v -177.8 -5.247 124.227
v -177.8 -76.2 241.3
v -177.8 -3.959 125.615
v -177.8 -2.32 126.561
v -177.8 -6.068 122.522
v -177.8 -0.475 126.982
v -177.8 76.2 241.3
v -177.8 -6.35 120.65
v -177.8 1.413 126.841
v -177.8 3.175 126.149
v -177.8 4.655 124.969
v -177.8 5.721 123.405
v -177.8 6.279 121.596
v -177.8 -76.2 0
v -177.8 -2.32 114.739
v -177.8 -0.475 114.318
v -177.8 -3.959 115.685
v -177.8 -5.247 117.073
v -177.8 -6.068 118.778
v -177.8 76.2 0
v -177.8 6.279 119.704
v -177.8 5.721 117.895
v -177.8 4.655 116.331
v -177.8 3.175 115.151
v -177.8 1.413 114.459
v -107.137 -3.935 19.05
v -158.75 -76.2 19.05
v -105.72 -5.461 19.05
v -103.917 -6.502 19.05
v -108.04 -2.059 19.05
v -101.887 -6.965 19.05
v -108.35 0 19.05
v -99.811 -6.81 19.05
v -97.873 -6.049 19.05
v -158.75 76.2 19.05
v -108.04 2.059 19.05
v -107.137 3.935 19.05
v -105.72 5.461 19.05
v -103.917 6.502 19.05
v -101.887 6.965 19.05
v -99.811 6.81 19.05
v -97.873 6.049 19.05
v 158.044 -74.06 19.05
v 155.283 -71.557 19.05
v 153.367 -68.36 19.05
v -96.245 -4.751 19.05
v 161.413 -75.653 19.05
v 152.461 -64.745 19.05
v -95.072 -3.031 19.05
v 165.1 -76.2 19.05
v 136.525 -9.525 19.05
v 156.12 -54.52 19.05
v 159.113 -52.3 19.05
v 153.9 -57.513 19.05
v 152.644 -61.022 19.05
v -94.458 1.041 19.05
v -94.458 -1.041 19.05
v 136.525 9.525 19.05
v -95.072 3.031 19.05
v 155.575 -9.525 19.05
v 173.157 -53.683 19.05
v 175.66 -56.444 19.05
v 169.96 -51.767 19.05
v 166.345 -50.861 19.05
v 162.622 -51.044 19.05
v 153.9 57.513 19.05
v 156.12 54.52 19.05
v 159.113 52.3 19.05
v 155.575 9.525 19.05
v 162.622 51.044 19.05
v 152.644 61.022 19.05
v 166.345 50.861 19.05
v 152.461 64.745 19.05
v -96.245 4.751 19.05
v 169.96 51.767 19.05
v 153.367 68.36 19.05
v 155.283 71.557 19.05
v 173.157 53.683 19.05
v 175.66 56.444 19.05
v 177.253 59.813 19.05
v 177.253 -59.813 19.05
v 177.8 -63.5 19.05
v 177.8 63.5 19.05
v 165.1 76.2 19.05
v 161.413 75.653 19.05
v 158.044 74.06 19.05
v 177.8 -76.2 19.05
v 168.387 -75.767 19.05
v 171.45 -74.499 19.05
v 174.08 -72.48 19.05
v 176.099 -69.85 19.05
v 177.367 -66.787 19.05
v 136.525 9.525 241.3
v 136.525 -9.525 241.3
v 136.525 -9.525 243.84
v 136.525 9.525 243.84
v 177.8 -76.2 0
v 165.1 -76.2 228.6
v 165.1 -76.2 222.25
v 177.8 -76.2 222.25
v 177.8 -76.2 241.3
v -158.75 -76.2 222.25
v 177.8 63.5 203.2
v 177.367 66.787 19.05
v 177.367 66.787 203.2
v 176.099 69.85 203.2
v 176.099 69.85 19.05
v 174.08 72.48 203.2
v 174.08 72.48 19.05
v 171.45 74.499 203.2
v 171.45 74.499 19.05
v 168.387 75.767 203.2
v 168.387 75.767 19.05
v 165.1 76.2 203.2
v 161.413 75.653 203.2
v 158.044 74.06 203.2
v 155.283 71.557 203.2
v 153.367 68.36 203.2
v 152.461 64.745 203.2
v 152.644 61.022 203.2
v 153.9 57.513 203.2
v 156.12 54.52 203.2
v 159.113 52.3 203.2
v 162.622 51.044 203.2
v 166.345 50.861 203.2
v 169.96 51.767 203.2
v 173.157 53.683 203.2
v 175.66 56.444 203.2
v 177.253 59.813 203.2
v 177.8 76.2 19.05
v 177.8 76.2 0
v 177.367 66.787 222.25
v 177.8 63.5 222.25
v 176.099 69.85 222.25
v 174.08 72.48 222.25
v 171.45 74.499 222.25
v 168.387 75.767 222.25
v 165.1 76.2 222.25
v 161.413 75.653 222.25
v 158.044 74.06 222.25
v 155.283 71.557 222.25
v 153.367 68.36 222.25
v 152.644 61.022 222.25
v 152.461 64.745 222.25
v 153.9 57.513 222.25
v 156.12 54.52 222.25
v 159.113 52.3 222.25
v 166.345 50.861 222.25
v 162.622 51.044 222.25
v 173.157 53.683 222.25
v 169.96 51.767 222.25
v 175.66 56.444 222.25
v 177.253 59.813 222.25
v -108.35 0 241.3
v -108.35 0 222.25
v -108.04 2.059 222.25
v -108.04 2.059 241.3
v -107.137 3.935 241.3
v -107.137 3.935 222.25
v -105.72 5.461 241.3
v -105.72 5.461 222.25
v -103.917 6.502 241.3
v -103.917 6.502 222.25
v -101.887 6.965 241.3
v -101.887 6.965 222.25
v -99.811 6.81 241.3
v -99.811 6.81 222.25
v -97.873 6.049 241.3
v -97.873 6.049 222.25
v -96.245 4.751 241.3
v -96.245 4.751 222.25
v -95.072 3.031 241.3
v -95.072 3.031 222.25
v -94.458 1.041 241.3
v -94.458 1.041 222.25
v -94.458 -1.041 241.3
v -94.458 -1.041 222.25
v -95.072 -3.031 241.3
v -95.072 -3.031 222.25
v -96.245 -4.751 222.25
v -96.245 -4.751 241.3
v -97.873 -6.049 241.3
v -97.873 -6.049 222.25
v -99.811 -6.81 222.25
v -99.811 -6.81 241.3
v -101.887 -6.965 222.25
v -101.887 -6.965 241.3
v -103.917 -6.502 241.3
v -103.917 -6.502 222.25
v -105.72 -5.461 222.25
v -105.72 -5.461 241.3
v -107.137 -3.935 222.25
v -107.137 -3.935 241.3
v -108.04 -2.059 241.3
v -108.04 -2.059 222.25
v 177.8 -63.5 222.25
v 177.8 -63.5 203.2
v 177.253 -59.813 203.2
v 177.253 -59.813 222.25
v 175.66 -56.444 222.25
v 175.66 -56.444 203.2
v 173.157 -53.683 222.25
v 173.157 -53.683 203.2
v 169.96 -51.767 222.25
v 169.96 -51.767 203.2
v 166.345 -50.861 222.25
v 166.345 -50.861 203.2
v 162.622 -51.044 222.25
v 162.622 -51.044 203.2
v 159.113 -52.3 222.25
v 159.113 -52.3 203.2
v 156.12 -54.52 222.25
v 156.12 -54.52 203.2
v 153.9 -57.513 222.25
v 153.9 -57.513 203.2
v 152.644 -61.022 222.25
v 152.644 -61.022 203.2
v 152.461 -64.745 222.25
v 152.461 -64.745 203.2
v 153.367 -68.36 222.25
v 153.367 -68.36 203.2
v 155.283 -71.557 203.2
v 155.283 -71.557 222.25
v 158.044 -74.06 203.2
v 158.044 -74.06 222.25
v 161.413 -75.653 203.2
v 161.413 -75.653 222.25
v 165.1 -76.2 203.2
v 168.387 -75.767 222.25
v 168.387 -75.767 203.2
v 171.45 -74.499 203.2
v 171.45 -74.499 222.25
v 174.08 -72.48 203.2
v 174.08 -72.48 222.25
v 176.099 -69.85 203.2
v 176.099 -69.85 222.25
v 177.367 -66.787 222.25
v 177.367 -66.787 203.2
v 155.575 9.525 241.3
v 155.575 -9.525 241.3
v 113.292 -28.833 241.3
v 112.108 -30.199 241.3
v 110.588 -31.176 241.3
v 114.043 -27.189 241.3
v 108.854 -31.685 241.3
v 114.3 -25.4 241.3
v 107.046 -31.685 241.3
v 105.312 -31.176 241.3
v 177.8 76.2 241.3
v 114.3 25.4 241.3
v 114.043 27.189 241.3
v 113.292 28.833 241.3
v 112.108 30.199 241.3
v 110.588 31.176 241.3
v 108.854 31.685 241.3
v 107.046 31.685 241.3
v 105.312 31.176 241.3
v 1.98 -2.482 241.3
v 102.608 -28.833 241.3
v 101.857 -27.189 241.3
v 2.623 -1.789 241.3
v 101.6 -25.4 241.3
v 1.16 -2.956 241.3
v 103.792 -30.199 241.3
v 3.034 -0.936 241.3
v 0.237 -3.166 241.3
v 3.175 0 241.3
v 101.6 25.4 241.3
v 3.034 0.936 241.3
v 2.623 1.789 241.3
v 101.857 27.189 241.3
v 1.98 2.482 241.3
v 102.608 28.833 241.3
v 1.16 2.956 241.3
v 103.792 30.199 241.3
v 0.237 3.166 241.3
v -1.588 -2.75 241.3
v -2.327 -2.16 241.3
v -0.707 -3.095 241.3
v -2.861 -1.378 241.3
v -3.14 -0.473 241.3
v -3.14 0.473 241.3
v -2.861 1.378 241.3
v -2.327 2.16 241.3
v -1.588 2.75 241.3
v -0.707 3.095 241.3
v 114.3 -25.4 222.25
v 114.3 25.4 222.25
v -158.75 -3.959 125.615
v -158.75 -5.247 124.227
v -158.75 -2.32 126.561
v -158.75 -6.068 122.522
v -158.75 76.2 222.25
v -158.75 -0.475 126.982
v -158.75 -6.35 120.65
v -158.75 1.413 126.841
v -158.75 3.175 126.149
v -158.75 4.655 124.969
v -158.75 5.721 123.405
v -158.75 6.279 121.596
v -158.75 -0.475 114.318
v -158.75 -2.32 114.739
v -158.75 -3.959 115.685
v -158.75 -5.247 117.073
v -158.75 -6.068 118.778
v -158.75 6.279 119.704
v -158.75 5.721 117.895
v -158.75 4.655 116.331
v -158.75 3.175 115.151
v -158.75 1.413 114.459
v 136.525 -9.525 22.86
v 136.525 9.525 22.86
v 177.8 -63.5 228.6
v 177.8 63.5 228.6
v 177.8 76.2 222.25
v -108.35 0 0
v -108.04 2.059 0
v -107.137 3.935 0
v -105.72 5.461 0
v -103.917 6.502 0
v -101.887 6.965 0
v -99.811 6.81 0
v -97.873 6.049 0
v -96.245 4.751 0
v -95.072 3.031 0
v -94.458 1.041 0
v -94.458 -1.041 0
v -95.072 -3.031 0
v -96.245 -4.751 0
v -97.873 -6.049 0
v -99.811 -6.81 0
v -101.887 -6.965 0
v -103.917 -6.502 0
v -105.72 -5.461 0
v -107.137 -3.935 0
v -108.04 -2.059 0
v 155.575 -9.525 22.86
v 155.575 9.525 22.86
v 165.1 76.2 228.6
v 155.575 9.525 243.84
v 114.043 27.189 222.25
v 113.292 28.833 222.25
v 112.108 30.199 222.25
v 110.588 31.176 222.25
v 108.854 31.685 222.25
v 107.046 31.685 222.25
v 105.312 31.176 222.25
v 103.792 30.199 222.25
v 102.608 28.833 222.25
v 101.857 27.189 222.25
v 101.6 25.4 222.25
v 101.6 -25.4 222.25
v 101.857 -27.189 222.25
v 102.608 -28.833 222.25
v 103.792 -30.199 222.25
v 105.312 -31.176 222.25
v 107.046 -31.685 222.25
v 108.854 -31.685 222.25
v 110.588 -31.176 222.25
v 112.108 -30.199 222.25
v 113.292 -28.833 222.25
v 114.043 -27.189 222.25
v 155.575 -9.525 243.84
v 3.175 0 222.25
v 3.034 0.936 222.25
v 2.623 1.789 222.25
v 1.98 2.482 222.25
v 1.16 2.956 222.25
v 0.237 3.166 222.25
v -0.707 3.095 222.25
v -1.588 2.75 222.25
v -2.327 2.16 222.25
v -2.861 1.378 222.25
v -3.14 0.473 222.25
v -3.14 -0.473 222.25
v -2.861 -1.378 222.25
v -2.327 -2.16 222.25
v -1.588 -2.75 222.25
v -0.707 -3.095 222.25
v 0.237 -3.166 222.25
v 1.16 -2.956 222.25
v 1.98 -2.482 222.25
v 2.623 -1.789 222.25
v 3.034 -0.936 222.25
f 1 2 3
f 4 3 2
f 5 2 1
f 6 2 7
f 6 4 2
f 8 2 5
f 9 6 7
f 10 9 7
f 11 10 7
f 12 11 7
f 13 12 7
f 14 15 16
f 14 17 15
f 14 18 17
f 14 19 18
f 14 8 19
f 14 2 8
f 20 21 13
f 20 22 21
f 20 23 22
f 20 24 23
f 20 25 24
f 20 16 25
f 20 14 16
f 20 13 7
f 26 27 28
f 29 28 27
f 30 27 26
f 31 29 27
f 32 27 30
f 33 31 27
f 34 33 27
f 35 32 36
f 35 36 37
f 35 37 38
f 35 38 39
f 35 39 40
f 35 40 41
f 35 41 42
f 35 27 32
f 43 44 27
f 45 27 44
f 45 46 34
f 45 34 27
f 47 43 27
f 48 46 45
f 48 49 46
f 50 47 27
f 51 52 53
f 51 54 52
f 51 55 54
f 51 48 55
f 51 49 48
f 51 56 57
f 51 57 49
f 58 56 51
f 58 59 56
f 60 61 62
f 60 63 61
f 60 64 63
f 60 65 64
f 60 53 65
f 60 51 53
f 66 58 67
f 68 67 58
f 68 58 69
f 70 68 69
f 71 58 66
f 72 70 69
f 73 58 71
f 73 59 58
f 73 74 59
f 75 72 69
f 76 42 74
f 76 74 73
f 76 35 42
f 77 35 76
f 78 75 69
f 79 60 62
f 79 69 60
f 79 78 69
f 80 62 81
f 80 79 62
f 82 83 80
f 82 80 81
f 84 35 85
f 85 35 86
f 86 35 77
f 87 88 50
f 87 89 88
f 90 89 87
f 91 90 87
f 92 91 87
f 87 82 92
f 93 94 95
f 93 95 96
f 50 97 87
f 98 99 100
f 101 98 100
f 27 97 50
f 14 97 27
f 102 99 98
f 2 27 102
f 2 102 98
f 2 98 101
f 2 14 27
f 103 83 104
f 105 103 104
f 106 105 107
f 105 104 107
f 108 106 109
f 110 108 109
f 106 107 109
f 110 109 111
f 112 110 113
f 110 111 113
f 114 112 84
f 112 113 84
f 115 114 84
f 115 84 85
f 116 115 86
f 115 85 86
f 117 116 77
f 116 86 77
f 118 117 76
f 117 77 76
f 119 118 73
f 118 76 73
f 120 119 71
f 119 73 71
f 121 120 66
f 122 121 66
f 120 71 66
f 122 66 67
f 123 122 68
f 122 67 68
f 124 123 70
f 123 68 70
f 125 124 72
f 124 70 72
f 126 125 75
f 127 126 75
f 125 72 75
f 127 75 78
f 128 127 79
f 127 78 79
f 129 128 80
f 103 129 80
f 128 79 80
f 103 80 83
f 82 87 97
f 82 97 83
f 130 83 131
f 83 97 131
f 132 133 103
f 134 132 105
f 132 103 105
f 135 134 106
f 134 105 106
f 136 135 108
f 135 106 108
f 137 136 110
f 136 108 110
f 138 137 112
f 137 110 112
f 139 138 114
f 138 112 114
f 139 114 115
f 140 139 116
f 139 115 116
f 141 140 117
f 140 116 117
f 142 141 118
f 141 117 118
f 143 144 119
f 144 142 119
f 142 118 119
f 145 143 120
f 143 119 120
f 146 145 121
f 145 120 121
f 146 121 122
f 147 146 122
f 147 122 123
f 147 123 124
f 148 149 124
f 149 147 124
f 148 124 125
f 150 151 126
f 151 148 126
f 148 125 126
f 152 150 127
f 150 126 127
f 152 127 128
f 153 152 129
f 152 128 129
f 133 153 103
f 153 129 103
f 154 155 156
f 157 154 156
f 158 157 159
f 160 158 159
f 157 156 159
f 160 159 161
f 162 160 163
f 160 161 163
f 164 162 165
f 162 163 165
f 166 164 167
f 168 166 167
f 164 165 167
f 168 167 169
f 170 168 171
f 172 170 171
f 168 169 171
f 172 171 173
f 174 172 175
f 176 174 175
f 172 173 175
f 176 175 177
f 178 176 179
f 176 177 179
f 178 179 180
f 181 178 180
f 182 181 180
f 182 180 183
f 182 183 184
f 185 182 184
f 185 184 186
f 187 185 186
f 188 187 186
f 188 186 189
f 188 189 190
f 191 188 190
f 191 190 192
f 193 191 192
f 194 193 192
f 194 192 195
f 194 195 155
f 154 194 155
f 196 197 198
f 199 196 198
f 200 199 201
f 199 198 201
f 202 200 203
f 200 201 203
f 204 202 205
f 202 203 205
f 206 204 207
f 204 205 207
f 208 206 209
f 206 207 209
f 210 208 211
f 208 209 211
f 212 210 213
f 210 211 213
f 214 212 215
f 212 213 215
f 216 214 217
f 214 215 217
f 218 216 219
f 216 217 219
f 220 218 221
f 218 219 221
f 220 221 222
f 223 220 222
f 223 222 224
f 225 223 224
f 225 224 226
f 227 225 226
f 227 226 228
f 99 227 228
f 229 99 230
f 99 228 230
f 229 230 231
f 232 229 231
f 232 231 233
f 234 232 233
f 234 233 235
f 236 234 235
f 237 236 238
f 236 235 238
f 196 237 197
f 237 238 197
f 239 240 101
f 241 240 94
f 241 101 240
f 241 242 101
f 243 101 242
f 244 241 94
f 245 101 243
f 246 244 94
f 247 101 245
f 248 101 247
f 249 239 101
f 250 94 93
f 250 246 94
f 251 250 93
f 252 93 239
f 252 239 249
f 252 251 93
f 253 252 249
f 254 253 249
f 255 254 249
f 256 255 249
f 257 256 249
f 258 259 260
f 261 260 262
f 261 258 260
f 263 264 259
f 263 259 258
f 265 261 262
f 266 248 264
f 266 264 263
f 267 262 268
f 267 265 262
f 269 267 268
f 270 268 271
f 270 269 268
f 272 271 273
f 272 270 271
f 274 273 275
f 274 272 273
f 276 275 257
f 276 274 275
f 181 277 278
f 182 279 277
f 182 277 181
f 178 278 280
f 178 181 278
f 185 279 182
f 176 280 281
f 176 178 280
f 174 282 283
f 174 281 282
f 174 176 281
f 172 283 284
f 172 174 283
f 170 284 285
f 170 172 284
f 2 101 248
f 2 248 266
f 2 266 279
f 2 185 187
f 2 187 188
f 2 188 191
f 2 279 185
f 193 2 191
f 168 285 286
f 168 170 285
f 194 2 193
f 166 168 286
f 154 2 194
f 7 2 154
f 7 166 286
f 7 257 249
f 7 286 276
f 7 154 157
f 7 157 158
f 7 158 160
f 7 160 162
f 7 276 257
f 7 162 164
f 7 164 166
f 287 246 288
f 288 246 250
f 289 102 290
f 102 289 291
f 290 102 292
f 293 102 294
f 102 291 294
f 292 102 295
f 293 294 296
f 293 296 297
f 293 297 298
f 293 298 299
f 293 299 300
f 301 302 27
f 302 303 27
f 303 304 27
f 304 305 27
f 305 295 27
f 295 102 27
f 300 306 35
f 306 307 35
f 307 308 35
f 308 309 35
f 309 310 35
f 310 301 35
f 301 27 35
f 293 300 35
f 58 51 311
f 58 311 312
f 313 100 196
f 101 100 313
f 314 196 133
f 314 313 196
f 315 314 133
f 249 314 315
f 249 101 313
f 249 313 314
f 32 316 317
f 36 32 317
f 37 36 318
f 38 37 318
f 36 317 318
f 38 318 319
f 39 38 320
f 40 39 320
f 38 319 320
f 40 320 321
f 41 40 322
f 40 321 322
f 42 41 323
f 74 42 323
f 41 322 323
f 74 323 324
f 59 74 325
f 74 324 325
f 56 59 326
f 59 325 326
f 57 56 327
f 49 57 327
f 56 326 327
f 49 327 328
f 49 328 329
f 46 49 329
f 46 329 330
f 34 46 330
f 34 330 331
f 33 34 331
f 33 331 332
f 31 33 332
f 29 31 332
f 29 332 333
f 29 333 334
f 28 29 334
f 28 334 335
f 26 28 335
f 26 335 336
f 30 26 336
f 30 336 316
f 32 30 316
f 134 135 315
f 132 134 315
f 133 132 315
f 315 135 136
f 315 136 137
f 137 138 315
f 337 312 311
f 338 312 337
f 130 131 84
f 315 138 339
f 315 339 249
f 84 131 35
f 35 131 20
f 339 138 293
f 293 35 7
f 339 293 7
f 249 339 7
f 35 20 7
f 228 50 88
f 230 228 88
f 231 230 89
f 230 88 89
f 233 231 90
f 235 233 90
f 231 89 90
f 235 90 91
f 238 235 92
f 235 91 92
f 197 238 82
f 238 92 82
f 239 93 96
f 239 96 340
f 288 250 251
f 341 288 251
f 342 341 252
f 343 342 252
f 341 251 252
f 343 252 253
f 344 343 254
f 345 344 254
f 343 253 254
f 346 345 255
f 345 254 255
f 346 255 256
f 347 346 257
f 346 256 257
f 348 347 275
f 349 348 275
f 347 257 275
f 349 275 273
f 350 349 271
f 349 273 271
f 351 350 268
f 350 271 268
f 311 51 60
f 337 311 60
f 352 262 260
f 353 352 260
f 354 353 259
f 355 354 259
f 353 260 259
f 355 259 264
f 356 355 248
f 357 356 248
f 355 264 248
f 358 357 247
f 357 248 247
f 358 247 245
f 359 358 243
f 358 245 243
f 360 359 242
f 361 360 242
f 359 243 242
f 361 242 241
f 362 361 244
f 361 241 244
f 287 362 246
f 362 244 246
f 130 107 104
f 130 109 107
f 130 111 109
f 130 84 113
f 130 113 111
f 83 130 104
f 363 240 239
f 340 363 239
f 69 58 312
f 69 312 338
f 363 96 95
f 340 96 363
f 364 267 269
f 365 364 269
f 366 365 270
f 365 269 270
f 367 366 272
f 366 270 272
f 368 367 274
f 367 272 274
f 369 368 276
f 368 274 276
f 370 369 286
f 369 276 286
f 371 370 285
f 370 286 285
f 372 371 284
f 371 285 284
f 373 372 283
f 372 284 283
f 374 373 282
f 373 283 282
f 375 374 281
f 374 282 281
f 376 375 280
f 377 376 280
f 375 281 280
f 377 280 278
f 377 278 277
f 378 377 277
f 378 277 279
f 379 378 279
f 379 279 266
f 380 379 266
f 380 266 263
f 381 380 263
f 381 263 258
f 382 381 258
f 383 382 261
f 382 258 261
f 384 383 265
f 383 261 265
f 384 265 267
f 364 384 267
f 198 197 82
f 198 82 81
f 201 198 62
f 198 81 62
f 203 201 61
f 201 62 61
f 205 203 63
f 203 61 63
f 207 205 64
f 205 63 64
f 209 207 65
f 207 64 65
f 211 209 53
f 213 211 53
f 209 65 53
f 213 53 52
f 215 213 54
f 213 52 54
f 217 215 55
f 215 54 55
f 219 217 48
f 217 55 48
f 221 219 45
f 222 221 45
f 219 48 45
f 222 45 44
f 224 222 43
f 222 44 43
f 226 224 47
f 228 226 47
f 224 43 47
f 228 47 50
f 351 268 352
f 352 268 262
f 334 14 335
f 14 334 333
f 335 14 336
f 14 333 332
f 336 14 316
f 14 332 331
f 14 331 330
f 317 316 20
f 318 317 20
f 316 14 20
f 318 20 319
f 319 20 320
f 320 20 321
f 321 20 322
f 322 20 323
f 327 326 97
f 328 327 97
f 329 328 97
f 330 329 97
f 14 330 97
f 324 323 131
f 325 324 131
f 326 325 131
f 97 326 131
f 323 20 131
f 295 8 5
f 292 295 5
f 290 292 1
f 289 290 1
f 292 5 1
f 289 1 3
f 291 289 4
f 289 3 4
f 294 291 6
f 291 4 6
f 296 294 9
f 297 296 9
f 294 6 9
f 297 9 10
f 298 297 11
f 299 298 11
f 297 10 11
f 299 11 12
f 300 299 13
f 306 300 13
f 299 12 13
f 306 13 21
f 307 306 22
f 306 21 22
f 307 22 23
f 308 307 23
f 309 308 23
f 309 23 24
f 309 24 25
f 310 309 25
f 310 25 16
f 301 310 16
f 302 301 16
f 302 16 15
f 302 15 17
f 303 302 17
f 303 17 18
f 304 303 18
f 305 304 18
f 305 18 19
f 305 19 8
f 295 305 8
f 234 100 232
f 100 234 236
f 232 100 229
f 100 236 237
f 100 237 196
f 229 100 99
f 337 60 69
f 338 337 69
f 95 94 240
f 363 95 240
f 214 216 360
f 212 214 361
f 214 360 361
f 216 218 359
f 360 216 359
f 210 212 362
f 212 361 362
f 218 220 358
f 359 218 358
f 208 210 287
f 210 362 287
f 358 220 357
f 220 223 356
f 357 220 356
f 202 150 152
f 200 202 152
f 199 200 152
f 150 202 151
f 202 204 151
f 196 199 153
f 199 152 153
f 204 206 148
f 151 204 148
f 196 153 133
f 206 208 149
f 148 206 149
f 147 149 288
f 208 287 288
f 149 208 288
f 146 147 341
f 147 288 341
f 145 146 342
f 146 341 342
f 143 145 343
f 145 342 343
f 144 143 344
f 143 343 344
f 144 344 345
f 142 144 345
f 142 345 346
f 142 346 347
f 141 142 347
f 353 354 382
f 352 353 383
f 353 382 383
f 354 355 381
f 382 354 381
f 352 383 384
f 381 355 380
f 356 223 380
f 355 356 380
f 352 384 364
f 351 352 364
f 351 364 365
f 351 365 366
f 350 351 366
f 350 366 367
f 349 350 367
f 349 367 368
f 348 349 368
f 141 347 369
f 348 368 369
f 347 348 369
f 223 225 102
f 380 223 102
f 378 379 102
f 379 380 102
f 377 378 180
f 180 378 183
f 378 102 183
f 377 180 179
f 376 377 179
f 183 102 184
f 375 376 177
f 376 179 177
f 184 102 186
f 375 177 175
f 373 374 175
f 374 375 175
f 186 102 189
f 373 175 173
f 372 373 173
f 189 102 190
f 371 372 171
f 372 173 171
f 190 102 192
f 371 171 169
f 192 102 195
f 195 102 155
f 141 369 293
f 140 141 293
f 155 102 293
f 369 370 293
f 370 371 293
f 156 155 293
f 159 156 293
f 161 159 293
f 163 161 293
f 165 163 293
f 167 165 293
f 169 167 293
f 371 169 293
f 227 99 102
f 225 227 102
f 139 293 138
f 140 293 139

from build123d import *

# Parameters (mm, degrees)
F0_W      = 355.6
F0_H      = 152.4
F1_DEPTH  = 19.05
F2_W      = 19.05
F2_H      = 152.4
F3_DEPTH  = 222.25
F5_DEPTH  = 184.15
F6_W      = 152.4
F6_H      = 19.05
F7_DEPTH  = 336.55
F5_FACE_R = 12.7
F8_DEPTH  = 25.4
F9_R      = 6.35
F10_DEPTH = 25.4
F13_DEPTH = 19.05
F14_R     = 3.175
F16_DEPTH = 19.05
F17_W     = 19.05
F17_H     = 19.05
F18_DEPTH = 3.81
F19_W     = 19.05
F19_H     = 19.05
F20_DEPTH = 2.54
F22_D     = 13.97


with BuildPart() as f1:
    # F0 (on Top) → F1 (new body)
    with BuildSketch(Plane.XY):
        Rectangle(F0_W, F0_H)
    extrude(amount=F1_DEPTH)

    # F2 (on face) → F3 (join)
    with BuildSketch(Plane.XY.offset(19.05)):
        with Locations((-168.275, 0)):
            Rectangle(F2_W, F2_H)
    extrude(amount=F3_DEPTH)

    # F4 (on face) → F5 (join)
    with BuildSketch(Plane.XY.offset(19.05)):
        with BuildLine():
            ThreePointArc((165.1, 76.2), (156.119744, 54.519744), (177.8, 63.5))
            ThreePointArc((177.8, 63.5), (174.080256, 72.480256), (165.1, 76.2))
        make_face()
        with BuildLine():
            ThreePointArc((165.1, -76.2), (174.080256, -72.480256), (177.8, -63.5))
            ThreePointArc((177.8, -63.5), (156.119744, -54.519744), (165.1, -76.2))
        make_face()
    extrude(amount=F5_DEPTH)

    # F6 (on face) → F7 (join)
    with BuildSketch(Plane.YZ.offset(-158.75)):
        with Locations((0, 231.775)):
            Rectangle(F6_W, F6_H)
    extrude(amount=F7_DEPTH)

    # F5_face (on face) → F8 (join)
    with BuildSketch(Plane(origin=(165.1, 63.5, 203.2), x_dir=(1, 0, 0), z_dir=(0, 0, 1))):
        Circle(F5_FACE_R)
        with Locations((0, -127)):
            Circle(F5_FACE_R)
    extrude(amount=F8_DEPTH)

    # F9 (on face) → F10 (cut)
    with BuildSketch(Plane(origin=(-177.8, 0, 0), x_dir=(0, -1, 0), z_dir=(-1, 0, 0))):
        with Locations((0, 120.65)):
            Circle(F9_R)
    extrude(amount=-F10_DEPTH, mode=Mode.SUBTRACT)

    # F12 (on face) → F13 (cut)
    with BuildSketch(Plane.XY.offset(241.3)):
        with BuildLine():
            Line((114.3, -25.4), (114.3, 25.4))
            ThreePointArc((114.3, 25.4), (107.95, 31.75), (101.6, 25.4))
            Line((101.6, 25.4), (101.6, -25.4))
            ThreePointArc((101.6, -25.4), (107.95, -31.75), (114.3, -25.4))
        make_face()
    extrude(amount=-F13_DEPTH, mode=Mode.SUBTRACT)

    # F14 (on face) → F16 (cut)
    with BuildSketch(Plane.XY.offset(241.3)):
        Circle(F14_R)
    extrude(amount=-F16_DEPTH, mode=Mode.SUBTRACT)

    # F17 (on face) → F18 (join)
    with BuildSketch(Plane.XY.offset(19.05)):
        with Locations((146.05, 0)):
            Rectangle(F17_W, F17_H)
    extrude(amount=F18_DEPTH)

    # F19 (on face) → F20 (join)
    with BuildSketch(Plane.XY.offset(241.3)):
        with Locations((146.05, 0)):
            Rectangle(F19_W, F19_H)
    extrude(amount=F20_DEPTH)

    # F22 (through all)
    with Locations(Plane.XY.offset(241.3)):
        with Locations((-101.365335, 0)):
            Hole(F22_D / 2)


solid = f1.part
